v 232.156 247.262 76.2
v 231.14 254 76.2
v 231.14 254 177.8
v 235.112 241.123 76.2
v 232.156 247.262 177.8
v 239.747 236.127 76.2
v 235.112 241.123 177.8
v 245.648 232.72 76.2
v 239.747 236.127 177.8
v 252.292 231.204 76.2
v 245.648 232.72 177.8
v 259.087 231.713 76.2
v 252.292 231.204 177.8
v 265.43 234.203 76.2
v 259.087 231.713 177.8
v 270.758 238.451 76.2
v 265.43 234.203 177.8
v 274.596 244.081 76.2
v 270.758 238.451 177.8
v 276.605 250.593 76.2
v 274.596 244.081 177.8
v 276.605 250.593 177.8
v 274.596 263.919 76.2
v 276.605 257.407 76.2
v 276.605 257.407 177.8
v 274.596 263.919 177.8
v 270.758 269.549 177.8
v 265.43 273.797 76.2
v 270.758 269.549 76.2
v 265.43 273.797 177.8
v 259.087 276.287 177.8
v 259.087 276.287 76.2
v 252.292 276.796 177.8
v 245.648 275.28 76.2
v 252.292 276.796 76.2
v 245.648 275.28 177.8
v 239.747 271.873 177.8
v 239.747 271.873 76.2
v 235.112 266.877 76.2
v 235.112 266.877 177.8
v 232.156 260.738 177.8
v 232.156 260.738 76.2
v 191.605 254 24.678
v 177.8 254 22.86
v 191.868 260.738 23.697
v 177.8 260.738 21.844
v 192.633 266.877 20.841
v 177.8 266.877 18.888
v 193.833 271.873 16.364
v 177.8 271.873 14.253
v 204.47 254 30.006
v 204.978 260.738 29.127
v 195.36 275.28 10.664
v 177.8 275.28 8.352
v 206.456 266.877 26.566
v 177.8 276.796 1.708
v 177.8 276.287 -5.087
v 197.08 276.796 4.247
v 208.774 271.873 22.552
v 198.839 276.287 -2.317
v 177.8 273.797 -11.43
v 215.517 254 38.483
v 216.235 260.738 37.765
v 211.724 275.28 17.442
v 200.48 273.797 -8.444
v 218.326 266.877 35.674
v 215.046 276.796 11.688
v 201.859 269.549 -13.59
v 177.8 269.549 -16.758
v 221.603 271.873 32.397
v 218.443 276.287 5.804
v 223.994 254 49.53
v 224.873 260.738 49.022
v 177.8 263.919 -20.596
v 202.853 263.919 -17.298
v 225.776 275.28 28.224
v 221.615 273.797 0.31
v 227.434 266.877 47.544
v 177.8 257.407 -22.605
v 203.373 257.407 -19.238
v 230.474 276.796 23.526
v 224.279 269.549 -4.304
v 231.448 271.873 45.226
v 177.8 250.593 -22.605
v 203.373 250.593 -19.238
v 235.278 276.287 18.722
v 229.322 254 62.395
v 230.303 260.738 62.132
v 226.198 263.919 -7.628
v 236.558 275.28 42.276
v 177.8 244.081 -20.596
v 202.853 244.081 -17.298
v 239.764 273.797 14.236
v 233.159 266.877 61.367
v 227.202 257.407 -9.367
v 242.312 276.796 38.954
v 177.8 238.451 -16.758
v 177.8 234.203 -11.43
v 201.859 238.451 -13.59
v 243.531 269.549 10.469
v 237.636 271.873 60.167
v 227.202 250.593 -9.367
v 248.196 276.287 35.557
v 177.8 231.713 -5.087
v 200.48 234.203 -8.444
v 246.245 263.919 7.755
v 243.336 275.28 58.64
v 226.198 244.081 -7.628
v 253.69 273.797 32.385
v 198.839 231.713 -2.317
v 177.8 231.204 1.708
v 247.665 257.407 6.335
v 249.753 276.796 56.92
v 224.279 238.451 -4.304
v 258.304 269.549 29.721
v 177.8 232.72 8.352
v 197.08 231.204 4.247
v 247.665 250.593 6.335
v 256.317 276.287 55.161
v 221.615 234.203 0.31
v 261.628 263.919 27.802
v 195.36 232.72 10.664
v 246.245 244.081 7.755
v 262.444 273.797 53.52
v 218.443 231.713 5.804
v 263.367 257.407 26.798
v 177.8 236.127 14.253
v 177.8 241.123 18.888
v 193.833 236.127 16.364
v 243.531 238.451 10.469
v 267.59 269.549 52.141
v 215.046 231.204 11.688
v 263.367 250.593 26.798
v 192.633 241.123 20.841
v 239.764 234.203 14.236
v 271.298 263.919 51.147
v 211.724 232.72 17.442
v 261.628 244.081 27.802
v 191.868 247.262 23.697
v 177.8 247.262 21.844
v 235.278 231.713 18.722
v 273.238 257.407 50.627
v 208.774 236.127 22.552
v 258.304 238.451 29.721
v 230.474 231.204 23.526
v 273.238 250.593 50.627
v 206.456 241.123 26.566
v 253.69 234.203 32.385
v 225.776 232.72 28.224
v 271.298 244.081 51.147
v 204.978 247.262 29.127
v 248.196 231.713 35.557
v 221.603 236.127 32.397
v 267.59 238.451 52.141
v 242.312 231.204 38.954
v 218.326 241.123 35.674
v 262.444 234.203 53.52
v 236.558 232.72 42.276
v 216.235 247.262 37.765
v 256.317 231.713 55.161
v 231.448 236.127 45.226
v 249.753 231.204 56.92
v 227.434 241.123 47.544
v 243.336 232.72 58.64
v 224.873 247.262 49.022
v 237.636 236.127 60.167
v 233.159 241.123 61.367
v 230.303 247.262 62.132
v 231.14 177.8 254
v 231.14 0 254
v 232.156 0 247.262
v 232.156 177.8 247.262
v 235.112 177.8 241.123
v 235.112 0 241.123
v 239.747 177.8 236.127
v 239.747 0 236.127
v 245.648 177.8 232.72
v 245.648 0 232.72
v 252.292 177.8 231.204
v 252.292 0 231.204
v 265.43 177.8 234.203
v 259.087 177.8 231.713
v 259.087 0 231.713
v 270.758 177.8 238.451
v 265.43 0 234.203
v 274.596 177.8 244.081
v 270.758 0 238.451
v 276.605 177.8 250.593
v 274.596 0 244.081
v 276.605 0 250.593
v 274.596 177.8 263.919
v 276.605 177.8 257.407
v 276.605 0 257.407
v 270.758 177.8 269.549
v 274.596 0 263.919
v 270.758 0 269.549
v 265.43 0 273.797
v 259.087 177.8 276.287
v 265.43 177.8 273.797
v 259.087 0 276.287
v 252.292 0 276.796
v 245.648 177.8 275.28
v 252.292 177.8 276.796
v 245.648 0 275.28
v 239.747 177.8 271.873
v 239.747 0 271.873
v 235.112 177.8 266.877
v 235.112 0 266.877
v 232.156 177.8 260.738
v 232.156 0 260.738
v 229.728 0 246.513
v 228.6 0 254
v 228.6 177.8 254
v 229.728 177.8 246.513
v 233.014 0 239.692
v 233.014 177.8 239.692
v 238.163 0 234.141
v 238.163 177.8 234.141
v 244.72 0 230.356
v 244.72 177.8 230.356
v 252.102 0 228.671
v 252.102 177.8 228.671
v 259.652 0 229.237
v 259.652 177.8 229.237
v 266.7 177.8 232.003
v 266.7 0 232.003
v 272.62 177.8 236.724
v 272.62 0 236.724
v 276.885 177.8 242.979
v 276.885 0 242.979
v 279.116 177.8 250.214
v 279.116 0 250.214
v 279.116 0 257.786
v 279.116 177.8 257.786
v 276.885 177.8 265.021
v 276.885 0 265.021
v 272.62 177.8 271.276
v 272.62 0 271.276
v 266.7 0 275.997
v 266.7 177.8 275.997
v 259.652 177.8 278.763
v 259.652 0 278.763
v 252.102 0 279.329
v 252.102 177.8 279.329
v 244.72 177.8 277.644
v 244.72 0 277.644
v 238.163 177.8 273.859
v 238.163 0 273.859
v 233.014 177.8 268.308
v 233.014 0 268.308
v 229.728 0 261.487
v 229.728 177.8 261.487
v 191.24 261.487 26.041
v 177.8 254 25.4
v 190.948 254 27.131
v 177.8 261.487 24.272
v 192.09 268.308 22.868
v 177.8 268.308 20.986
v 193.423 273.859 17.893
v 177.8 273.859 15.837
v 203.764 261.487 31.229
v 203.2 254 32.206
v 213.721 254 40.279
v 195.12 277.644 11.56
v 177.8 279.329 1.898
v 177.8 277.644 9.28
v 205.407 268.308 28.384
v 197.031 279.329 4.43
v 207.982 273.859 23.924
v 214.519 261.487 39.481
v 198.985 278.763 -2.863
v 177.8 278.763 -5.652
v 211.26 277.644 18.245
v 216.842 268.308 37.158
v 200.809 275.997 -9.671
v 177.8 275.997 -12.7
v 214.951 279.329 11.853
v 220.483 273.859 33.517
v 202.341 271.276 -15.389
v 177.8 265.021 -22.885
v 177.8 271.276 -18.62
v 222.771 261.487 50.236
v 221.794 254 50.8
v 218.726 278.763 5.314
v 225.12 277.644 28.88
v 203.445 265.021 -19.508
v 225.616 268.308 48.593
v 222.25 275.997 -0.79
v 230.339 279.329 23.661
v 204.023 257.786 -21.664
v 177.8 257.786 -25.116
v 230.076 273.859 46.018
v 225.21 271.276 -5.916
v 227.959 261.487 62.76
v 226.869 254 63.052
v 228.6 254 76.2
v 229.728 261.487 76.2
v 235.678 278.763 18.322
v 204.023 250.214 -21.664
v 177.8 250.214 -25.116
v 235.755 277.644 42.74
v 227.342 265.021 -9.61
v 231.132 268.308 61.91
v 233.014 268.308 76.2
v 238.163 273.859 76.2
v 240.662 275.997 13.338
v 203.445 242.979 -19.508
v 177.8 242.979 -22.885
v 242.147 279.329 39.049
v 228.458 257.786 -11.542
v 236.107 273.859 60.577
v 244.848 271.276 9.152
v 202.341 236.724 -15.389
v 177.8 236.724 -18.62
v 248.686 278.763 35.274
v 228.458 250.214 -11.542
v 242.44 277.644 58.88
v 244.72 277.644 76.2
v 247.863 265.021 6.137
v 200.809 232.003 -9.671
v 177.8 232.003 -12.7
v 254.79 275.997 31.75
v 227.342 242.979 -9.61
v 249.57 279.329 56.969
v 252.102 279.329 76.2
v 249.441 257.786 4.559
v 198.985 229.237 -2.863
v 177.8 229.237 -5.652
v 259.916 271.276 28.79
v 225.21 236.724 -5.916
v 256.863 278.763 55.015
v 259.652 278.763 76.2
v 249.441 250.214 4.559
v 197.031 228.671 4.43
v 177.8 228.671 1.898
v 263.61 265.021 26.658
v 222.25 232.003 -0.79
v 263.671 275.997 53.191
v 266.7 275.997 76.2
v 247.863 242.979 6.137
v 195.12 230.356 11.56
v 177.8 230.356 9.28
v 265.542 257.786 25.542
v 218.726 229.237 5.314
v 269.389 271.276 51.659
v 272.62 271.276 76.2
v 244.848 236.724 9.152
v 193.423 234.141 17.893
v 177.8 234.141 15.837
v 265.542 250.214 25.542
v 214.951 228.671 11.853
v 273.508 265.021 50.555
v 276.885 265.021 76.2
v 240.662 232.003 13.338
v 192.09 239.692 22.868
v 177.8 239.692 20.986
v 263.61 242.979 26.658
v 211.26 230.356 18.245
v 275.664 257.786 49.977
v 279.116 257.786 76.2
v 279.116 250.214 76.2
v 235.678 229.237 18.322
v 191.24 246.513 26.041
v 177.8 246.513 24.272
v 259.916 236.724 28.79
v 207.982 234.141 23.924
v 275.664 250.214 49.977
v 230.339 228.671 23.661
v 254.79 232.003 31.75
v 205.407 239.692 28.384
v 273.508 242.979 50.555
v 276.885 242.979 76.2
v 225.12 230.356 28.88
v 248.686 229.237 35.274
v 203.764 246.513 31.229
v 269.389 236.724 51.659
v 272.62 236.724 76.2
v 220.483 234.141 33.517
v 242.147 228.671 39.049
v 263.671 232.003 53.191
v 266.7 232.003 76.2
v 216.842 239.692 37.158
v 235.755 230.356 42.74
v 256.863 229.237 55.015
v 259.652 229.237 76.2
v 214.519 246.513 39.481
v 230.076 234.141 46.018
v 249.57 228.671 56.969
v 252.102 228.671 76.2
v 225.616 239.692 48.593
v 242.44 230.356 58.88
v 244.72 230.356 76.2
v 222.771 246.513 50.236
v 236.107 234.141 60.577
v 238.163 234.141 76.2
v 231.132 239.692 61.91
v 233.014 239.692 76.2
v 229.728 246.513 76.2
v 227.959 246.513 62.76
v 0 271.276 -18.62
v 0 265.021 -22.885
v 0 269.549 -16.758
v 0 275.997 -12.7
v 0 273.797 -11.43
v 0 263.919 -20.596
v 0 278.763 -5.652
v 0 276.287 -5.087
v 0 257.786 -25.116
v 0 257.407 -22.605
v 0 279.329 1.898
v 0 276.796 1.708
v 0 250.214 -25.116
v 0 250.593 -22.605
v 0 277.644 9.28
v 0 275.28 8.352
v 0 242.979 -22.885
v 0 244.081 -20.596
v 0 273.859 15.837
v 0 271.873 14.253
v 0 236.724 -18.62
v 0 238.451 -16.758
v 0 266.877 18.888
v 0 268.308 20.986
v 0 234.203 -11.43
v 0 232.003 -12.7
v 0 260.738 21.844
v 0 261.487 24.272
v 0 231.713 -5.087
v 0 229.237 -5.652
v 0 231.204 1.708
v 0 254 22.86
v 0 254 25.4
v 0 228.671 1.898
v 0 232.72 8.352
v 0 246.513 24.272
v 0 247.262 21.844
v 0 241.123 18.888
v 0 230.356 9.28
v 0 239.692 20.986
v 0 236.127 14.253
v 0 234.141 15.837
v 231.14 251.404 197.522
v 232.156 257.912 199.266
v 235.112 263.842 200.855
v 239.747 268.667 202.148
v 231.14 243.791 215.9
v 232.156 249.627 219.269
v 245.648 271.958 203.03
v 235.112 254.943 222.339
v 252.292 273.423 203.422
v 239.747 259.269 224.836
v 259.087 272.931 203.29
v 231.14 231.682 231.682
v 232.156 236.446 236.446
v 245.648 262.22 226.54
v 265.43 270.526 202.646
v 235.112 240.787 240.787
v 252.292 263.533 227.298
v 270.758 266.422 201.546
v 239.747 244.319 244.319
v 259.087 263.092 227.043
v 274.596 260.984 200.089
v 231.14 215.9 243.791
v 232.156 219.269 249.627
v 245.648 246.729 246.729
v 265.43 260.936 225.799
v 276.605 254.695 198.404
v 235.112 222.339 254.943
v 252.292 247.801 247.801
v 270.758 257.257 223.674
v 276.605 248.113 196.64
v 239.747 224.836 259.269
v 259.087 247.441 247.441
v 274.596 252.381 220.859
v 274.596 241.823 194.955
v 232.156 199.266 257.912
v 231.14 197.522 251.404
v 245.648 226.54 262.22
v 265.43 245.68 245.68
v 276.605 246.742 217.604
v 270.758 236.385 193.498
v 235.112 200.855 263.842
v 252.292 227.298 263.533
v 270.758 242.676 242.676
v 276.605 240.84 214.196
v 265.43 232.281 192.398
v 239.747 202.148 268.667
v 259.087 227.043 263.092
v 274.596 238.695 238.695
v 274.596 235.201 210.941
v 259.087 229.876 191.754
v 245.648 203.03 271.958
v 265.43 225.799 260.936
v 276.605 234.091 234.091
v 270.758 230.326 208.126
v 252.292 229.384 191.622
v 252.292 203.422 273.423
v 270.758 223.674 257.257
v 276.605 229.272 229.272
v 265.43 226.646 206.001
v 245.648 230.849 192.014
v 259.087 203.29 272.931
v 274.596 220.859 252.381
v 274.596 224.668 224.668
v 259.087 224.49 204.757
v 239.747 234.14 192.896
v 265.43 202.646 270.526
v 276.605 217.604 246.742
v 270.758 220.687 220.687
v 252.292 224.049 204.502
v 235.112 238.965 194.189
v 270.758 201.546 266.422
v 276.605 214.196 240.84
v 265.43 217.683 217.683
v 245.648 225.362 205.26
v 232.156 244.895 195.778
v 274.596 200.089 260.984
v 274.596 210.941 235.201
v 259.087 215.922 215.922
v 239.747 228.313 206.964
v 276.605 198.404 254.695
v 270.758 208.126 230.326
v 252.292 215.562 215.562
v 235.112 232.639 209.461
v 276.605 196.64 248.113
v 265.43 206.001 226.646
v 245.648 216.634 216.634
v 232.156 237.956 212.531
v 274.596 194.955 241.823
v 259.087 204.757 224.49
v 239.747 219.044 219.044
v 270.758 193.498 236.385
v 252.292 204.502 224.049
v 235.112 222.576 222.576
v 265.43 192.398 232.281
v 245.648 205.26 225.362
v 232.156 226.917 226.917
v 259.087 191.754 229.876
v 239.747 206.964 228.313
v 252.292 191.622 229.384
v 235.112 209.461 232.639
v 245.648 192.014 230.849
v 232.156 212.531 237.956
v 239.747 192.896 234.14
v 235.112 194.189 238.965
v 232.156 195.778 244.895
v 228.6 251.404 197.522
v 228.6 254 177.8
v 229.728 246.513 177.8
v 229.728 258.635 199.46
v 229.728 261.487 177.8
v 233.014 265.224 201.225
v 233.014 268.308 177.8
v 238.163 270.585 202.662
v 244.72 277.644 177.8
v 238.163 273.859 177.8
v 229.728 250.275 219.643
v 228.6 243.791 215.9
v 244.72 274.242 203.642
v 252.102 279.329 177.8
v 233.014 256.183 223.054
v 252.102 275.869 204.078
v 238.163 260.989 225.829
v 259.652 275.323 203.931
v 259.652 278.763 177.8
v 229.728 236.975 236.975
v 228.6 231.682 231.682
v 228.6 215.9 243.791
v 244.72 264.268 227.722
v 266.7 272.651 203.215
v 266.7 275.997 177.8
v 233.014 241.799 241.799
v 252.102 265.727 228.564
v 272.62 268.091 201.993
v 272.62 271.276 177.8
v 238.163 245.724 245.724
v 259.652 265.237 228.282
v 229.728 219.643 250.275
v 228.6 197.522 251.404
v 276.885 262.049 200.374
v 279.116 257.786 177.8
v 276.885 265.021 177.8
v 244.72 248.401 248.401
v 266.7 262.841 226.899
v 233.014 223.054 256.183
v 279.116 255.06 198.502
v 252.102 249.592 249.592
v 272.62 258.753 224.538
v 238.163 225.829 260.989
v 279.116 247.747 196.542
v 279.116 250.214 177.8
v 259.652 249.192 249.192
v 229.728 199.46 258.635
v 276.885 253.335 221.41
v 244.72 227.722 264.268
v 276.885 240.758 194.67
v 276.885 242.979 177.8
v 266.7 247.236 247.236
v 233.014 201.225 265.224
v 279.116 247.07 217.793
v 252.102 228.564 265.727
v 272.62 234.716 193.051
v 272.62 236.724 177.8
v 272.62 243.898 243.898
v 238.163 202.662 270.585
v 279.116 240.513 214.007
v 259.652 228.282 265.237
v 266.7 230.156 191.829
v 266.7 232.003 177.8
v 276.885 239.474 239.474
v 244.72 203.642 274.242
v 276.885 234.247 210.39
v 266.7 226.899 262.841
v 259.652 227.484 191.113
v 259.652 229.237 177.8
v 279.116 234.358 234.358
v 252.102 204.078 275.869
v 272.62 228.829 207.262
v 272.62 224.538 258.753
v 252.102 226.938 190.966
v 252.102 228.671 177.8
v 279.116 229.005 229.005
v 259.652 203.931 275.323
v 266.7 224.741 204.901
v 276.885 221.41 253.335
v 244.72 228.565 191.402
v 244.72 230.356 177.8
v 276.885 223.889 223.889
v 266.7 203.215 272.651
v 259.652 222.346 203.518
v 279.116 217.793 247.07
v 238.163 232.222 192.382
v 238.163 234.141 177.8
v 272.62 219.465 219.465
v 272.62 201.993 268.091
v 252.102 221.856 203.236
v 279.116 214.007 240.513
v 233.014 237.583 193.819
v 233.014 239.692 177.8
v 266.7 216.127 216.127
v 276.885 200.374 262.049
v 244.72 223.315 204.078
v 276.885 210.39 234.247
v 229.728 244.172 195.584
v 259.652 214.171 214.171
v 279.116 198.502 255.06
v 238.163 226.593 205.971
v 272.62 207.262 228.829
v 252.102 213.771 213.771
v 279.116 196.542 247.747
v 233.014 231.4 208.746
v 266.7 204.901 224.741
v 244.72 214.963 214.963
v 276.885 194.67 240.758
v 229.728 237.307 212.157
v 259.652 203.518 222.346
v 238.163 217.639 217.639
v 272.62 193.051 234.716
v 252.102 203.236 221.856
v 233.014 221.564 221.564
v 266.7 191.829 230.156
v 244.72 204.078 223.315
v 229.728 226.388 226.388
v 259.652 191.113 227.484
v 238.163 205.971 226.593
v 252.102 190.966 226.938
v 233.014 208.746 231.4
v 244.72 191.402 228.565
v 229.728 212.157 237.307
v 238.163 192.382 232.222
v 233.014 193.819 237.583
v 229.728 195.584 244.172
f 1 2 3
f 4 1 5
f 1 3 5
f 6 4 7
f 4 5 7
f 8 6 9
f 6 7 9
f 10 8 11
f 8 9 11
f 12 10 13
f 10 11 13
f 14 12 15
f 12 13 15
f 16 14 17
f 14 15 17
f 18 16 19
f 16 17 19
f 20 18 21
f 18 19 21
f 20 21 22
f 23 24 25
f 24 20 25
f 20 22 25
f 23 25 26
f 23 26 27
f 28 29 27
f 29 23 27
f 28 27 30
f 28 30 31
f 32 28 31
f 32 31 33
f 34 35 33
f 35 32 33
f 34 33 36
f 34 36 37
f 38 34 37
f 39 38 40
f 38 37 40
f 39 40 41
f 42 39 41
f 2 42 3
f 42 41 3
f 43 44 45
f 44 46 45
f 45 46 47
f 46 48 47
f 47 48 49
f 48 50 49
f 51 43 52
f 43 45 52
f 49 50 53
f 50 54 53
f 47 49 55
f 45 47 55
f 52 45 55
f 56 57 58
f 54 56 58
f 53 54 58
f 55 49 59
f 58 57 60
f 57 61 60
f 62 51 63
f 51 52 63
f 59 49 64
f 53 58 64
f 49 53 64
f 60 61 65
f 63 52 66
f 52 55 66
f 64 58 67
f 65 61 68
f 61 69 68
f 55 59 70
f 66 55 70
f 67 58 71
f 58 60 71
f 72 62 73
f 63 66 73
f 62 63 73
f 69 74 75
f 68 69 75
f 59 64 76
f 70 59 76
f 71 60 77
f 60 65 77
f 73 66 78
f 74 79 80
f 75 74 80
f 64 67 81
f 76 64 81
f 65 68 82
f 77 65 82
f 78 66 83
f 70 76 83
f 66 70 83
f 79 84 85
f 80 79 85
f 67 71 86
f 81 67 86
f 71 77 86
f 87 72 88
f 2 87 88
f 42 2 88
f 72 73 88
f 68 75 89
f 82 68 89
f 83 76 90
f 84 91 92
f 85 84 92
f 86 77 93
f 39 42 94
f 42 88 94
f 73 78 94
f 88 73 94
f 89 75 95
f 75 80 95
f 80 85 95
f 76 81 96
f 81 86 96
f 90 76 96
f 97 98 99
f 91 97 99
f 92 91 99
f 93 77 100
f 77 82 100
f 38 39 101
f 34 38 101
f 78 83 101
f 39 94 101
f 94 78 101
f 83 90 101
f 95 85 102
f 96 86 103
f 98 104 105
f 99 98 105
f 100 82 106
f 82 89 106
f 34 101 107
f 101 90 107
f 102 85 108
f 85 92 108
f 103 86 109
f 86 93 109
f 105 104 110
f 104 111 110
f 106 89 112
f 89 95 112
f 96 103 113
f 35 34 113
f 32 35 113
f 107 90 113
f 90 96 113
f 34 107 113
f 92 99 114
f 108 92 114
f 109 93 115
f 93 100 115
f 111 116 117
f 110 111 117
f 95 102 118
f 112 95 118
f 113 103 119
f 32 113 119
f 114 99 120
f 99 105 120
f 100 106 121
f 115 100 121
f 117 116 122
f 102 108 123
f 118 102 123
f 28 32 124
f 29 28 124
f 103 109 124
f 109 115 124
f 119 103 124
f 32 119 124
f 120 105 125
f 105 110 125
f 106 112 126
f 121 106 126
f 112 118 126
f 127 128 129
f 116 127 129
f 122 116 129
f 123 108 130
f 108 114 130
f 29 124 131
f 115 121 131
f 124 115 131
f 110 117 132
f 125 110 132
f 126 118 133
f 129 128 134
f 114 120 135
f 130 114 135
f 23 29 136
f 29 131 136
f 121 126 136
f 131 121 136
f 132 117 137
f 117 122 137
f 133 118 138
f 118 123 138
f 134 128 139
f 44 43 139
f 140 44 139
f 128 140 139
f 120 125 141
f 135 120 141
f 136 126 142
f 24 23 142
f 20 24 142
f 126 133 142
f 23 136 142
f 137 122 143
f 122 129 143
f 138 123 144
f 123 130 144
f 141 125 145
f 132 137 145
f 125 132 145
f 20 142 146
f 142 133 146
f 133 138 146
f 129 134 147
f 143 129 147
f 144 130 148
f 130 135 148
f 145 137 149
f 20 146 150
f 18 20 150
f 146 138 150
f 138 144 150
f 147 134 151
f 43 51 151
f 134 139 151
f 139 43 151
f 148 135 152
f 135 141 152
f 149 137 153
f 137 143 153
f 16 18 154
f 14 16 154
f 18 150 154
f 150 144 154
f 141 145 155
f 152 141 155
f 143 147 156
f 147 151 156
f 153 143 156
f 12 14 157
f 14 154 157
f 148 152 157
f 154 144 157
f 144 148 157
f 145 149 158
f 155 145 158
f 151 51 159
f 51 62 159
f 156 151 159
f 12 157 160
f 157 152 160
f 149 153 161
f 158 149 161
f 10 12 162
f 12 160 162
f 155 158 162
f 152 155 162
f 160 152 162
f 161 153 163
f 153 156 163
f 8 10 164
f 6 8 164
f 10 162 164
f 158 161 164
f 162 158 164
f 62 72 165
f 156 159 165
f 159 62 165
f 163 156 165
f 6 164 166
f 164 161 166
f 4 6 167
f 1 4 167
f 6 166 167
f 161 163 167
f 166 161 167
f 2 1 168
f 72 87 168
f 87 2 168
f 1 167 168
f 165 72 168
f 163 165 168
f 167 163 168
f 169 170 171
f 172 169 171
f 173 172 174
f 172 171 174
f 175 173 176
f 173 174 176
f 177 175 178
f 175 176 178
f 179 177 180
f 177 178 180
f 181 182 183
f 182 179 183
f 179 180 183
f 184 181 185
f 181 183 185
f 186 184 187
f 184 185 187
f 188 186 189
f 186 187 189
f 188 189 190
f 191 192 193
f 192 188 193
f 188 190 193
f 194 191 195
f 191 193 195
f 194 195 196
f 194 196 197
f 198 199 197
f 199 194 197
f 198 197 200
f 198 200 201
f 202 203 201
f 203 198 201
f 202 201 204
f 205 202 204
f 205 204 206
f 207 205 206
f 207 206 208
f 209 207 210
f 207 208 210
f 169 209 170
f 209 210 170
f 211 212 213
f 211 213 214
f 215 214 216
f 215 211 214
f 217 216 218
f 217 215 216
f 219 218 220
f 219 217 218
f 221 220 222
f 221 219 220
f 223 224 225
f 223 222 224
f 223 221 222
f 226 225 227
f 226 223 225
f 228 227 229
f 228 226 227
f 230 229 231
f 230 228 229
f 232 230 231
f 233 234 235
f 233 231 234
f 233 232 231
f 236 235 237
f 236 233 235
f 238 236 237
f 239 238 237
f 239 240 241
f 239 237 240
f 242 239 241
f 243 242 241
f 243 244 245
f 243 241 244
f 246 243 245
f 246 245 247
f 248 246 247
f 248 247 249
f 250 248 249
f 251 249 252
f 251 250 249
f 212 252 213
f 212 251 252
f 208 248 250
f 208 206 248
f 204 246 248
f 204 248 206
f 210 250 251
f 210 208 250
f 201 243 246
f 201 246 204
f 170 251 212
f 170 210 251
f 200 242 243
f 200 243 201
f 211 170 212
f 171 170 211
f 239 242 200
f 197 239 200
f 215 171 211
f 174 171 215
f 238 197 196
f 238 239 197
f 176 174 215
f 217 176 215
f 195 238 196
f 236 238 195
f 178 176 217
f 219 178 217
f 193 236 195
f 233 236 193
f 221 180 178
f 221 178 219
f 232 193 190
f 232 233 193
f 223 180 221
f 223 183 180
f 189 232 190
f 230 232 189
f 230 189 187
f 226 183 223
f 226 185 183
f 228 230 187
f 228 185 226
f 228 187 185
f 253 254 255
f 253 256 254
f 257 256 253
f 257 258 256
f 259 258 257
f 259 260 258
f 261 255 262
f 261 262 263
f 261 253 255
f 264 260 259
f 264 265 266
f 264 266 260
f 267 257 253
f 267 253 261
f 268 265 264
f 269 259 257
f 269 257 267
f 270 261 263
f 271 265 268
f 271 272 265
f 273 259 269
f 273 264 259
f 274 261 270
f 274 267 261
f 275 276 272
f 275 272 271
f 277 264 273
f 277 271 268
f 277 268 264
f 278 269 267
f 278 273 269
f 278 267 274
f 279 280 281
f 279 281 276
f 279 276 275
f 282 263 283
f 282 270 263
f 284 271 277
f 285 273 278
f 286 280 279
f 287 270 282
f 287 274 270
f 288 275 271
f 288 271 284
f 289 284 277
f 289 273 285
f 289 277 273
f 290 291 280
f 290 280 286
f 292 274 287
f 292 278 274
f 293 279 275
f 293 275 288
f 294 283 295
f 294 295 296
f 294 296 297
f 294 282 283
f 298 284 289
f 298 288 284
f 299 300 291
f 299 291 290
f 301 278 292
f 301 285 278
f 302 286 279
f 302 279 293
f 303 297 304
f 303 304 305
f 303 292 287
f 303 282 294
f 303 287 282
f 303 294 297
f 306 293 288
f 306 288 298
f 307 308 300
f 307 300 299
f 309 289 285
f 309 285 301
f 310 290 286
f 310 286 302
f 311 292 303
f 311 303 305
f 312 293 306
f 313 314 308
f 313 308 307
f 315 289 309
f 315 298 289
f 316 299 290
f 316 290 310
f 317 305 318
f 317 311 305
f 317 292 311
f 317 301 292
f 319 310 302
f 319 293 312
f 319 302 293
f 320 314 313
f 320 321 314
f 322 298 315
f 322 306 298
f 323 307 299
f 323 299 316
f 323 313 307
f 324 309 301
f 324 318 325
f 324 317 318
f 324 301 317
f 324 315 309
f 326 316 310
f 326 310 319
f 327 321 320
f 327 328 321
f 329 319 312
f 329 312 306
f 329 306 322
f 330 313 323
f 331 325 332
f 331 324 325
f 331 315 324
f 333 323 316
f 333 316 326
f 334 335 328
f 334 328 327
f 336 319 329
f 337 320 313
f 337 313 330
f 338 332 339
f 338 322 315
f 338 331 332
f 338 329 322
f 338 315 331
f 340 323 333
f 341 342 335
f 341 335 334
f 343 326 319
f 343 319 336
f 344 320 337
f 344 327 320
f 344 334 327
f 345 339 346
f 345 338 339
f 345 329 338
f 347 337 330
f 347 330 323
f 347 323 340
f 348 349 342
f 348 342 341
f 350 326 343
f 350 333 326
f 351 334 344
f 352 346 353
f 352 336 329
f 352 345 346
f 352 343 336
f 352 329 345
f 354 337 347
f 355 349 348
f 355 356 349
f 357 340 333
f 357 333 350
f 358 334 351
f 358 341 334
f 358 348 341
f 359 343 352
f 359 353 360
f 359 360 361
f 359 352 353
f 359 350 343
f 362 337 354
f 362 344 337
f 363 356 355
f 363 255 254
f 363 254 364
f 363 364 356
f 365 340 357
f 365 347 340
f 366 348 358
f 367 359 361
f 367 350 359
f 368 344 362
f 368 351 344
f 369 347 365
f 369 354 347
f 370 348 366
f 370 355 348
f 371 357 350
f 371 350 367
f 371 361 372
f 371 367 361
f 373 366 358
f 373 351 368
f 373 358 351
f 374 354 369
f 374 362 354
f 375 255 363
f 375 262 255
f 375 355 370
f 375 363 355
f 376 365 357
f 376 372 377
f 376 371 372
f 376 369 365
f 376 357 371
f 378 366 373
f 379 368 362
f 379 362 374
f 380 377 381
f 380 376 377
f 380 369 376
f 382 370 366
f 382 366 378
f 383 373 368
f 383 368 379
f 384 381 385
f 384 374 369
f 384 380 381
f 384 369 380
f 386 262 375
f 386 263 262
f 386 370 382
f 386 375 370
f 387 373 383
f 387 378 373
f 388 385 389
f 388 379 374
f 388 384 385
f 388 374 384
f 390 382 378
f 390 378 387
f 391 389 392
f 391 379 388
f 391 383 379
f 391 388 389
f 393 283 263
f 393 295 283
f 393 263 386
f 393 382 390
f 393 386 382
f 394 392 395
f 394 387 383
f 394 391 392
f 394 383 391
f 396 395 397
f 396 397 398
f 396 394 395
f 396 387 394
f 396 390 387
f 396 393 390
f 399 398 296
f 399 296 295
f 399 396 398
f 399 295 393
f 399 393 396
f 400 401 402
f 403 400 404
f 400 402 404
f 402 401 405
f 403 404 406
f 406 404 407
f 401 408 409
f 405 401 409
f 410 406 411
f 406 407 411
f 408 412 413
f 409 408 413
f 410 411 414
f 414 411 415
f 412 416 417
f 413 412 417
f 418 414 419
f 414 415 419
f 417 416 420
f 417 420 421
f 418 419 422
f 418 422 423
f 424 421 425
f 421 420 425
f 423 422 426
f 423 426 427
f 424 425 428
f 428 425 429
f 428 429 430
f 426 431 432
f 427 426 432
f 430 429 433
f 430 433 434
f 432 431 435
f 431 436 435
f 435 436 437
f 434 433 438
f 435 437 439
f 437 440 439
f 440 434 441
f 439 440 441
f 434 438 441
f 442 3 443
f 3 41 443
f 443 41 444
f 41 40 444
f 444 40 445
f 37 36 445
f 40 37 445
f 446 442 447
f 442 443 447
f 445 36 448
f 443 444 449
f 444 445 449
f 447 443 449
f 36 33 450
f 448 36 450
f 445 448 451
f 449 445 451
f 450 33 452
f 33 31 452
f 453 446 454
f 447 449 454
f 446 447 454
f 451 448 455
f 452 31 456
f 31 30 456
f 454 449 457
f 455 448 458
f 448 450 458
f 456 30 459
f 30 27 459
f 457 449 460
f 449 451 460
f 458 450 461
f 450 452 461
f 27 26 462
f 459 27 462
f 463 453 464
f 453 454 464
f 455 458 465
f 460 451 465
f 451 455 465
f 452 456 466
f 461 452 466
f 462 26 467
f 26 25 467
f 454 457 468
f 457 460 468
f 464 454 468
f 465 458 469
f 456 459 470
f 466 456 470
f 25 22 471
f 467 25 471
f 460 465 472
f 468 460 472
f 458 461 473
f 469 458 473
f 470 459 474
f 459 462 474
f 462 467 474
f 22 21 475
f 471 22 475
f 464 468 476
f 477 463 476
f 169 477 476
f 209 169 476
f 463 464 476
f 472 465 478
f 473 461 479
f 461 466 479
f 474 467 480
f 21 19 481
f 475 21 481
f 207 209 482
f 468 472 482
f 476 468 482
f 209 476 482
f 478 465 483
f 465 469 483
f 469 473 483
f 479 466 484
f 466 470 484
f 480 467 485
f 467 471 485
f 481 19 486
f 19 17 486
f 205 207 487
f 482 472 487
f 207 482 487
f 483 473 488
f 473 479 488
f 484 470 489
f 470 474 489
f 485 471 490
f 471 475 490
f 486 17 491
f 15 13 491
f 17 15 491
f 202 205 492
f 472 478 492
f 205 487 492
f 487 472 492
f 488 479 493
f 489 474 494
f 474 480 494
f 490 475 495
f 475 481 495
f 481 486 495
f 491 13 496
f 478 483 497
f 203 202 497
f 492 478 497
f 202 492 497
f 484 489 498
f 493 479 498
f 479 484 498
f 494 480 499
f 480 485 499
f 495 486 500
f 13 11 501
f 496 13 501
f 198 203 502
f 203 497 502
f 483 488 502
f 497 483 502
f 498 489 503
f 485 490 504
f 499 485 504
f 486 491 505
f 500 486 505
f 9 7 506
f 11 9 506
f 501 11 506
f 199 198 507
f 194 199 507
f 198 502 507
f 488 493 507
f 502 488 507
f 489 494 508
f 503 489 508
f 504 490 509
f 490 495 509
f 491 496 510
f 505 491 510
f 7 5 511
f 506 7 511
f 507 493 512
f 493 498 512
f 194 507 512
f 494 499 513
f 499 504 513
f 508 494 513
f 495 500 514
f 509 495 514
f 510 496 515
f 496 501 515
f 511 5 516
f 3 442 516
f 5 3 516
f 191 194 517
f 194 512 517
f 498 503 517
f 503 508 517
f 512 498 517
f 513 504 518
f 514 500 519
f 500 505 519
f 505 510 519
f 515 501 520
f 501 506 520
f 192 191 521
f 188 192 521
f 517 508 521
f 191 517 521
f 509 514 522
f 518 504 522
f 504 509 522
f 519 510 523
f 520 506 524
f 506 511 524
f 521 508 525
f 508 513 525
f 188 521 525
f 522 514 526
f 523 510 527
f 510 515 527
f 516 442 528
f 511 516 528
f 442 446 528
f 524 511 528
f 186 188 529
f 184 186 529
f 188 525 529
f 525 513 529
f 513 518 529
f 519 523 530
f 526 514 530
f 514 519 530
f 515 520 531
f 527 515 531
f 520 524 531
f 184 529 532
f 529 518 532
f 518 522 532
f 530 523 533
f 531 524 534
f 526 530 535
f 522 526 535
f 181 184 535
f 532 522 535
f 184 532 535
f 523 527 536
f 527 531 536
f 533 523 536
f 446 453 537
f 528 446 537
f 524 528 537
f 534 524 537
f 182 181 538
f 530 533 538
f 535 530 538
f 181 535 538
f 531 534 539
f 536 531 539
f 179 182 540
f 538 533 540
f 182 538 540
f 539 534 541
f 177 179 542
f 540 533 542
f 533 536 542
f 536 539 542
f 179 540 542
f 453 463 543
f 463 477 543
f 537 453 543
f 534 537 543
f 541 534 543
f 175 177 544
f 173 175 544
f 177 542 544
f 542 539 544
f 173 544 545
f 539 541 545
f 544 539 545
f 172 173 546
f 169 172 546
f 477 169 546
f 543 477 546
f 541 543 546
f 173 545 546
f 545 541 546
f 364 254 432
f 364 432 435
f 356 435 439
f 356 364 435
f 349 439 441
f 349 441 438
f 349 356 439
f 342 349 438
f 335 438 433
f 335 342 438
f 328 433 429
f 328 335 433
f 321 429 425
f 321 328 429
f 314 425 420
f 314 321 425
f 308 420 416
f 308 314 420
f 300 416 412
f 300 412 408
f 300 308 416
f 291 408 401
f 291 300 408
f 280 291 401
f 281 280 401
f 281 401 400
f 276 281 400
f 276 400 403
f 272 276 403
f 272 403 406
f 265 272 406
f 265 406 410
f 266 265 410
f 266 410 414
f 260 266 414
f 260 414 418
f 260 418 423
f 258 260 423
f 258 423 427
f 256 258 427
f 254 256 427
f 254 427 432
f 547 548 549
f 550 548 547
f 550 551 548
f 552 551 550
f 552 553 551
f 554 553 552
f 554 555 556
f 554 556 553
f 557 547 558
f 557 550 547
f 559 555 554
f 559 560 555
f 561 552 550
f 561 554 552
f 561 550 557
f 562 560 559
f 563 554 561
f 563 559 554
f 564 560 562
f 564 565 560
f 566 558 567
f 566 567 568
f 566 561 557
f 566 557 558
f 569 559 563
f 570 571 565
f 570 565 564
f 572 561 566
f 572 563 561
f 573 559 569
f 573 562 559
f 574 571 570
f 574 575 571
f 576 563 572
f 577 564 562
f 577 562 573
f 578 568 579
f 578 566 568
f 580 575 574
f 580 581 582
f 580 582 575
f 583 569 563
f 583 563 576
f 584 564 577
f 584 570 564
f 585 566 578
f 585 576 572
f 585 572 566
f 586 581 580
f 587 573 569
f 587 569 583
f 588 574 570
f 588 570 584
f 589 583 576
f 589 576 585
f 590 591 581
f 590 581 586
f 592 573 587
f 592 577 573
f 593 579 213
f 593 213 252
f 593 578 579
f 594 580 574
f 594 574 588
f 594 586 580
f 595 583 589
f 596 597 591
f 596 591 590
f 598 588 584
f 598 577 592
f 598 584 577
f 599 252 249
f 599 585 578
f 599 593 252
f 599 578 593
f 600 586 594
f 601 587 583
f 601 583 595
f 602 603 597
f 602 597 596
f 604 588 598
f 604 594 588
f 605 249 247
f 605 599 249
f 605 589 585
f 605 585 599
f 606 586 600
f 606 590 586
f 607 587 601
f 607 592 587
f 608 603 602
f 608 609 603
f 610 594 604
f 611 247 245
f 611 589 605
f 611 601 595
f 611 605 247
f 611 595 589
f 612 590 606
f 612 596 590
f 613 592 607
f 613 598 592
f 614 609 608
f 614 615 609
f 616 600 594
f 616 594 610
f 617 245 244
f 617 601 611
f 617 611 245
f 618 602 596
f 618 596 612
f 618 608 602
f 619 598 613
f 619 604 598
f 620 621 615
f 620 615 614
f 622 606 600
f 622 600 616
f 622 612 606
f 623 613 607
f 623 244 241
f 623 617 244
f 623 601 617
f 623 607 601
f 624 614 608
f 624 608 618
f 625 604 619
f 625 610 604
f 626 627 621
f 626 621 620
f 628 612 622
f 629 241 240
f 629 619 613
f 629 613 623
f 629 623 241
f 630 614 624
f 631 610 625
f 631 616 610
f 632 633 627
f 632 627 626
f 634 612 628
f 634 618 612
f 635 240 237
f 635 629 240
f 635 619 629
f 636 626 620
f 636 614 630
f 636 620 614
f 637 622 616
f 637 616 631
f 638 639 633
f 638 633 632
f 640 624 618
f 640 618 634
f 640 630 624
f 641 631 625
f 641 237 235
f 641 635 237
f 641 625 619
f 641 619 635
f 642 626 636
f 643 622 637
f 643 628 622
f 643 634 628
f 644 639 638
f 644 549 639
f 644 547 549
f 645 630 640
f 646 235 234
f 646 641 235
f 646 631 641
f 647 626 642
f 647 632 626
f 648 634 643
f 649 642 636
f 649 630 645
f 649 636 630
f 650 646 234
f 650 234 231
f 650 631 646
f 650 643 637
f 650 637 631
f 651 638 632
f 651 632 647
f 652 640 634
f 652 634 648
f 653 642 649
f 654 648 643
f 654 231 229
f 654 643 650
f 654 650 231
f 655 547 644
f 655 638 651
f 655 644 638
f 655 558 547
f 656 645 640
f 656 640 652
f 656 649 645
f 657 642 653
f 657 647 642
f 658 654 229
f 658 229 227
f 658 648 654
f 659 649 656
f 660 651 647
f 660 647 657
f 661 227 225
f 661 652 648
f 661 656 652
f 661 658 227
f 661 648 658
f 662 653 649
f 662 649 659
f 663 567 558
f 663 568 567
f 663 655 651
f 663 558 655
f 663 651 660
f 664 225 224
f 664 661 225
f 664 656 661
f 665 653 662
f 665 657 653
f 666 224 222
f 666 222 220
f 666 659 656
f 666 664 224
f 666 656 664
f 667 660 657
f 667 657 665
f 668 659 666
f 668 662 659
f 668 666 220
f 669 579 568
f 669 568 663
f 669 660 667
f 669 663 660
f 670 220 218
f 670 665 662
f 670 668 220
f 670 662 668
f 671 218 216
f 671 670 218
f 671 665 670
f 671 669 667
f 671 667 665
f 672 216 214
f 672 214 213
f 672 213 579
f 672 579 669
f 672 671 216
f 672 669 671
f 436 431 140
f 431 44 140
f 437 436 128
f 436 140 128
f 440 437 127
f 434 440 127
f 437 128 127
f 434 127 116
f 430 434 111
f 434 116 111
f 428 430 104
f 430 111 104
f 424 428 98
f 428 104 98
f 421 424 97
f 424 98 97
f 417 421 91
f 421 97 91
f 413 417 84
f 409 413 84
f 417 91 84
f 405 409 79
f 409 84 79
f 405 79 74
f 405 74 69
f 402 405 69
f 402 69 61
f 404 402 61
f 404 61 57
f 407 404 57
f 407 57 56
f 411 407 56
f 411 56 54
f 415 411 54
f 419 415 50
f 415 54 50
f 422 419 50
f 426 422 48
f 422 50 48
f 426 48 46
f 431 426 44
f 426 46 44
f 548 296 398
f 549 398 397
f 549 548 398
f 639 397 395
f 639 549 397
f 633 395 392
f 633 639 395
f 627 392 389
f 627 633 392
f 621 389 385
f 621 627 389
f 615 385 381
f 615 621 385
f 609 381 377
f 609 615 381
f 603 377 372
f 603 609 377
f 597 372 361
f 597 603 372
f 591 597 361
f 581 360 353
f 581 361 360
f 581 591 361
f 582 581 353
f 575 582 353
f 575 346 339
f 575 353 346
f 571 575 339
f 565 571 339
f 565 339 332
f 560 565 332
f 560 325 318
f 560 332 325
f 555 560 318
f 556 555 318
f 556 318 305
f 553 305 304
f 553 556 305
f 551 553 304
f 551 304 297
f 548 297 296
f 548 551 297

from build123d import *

# Parameters (mm, degrees)
SWEEP1_PROFILE_R = 25.4
SHELL1_T         = -2.54


with BuildPart() as part:
    # Sweep1: sweep along a curve in space
    with BuildLine() as sweep1_path:
        Line((0, 254, 0), (177.8, 254, 0))
        ThreePointArc((177.8, 254, 0), (231.681536726, 254, 22.318463274), (254, 254, 76.2))
        Line((254, 254, 76.2), (254, 254, 177.8))
        ThreePointArc((254, 254, 177.8), (254, 231.681536726, 231.681536726), (254, 177.8, 254))
        Line((254, 177.8, 254), (254, 0, 254))
    # Sweep1 profile (on start of the path) → Sweep1 (sweep)
    with BuildSketch(Plane(origin=(0, 254, 0), x_dir=(0, 0, 1), z_dir=(1, 0, 0))):
        Circle(SWEEP1_PROFILE_R)
    sweep(path=sweep1_path.line)

    # Shell1
    shell1_openings = [part.faces().sort_by_distance(p)[0] for p in [
        (254, 0, 254),
        (0, 254, 0),
    ]]
    offset(amount=SHELL1_T, openings=shell1_openings, kind=Kind.INTERSECTION)


solid = part.part
